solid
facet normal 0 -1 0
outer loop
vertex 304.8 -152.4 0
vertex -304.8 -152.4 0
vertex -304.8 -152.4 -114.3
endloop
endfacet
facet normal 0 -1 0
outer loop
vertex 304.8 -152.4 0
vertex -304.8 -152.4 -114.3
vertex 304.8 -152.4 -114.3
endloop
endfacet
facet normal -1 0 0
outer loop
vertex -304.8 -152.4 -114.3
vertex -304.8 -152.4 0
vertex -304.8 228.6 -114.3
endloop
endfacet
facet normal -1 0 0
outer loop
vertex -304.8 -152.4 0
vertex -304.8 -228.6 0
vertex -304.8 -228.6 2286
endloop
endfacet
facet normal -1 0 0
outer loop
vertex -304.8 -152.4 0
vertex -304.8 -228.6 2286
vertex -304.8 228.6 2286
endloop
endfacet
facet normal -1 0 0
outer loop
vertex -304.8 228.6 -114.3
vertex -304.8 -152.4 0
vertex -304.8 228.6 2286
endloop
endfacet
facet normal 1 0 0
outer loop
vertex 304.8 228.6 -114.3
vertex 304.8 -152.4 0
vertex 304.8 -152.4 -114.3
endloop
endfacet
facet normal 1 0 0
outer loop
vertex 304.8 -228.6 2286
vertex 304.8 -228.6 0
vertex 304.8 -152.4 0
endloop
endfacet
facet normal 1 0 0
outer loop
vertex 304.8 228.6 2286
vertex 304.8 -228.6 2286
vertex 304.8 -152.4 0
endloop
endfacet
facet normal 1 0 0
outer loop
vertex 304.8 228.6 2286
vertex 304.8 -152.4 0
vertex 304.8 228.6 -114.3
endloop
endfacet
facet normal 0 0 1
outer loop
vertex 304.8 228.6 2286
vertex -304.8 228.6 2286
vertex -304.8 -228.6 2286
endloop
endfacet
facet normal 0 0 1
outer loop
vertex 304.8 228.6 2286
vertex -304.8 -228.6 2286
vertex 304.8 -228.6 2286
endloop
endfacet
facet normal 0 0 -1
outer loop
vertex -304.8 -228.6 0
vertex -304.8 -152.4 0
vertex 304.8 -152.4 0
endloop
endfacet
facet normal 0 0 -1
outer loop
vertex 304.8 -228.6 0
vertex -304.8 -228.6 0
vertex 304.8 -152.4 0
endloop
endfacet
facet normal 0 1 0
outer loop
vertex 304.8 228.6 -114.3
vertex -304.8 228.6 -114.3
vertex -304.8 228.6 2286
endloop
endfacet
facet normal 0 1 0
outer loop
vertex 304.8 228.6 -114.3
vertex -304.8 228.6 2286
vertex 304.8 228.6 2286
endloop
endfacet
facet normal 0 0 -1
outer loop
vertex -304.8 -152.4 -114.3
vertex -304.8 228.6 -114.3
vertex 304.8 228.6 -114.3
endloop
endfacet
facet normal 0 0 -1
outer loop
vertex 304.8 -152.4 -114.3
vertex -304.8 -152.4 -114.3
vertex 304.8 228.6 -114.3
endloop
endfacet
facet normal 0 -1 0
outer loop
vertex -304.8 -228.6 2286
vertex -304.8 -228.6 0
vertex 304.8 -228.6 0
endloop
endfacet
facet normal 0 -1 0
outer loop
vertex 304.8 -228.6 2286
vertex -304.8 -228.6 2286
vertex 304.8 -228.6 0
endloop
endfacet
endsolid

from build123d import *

# Parameters (mm, degrees)
F0_W     = 609.6
F0_H     = 381
F0_H_2   = 76.2
F1_DEPTH = 2286
F2_DEPTH = 114.3


with BuildPart() as f1:
    # F0 (on Top) → F1 (new body)
    with BuildSketch(Plane.XY):
        with Locations((0, 38.1)):
            Rectangle(F0_W, F0_H)
        with Locations((0, -190.5)):
            Rectangle(F0_W, F0_H_2)
    extrude(amount=F1_DEPTH)

    # F0 (on Top) → F2 (join)
    with BuildSketch(Plane.XY):
        with Locations((0, 38.1)):
            Rectangle(F0_W, F0_H)
    extrude(amount=-F2_DEPTH)


solid = f1.part
